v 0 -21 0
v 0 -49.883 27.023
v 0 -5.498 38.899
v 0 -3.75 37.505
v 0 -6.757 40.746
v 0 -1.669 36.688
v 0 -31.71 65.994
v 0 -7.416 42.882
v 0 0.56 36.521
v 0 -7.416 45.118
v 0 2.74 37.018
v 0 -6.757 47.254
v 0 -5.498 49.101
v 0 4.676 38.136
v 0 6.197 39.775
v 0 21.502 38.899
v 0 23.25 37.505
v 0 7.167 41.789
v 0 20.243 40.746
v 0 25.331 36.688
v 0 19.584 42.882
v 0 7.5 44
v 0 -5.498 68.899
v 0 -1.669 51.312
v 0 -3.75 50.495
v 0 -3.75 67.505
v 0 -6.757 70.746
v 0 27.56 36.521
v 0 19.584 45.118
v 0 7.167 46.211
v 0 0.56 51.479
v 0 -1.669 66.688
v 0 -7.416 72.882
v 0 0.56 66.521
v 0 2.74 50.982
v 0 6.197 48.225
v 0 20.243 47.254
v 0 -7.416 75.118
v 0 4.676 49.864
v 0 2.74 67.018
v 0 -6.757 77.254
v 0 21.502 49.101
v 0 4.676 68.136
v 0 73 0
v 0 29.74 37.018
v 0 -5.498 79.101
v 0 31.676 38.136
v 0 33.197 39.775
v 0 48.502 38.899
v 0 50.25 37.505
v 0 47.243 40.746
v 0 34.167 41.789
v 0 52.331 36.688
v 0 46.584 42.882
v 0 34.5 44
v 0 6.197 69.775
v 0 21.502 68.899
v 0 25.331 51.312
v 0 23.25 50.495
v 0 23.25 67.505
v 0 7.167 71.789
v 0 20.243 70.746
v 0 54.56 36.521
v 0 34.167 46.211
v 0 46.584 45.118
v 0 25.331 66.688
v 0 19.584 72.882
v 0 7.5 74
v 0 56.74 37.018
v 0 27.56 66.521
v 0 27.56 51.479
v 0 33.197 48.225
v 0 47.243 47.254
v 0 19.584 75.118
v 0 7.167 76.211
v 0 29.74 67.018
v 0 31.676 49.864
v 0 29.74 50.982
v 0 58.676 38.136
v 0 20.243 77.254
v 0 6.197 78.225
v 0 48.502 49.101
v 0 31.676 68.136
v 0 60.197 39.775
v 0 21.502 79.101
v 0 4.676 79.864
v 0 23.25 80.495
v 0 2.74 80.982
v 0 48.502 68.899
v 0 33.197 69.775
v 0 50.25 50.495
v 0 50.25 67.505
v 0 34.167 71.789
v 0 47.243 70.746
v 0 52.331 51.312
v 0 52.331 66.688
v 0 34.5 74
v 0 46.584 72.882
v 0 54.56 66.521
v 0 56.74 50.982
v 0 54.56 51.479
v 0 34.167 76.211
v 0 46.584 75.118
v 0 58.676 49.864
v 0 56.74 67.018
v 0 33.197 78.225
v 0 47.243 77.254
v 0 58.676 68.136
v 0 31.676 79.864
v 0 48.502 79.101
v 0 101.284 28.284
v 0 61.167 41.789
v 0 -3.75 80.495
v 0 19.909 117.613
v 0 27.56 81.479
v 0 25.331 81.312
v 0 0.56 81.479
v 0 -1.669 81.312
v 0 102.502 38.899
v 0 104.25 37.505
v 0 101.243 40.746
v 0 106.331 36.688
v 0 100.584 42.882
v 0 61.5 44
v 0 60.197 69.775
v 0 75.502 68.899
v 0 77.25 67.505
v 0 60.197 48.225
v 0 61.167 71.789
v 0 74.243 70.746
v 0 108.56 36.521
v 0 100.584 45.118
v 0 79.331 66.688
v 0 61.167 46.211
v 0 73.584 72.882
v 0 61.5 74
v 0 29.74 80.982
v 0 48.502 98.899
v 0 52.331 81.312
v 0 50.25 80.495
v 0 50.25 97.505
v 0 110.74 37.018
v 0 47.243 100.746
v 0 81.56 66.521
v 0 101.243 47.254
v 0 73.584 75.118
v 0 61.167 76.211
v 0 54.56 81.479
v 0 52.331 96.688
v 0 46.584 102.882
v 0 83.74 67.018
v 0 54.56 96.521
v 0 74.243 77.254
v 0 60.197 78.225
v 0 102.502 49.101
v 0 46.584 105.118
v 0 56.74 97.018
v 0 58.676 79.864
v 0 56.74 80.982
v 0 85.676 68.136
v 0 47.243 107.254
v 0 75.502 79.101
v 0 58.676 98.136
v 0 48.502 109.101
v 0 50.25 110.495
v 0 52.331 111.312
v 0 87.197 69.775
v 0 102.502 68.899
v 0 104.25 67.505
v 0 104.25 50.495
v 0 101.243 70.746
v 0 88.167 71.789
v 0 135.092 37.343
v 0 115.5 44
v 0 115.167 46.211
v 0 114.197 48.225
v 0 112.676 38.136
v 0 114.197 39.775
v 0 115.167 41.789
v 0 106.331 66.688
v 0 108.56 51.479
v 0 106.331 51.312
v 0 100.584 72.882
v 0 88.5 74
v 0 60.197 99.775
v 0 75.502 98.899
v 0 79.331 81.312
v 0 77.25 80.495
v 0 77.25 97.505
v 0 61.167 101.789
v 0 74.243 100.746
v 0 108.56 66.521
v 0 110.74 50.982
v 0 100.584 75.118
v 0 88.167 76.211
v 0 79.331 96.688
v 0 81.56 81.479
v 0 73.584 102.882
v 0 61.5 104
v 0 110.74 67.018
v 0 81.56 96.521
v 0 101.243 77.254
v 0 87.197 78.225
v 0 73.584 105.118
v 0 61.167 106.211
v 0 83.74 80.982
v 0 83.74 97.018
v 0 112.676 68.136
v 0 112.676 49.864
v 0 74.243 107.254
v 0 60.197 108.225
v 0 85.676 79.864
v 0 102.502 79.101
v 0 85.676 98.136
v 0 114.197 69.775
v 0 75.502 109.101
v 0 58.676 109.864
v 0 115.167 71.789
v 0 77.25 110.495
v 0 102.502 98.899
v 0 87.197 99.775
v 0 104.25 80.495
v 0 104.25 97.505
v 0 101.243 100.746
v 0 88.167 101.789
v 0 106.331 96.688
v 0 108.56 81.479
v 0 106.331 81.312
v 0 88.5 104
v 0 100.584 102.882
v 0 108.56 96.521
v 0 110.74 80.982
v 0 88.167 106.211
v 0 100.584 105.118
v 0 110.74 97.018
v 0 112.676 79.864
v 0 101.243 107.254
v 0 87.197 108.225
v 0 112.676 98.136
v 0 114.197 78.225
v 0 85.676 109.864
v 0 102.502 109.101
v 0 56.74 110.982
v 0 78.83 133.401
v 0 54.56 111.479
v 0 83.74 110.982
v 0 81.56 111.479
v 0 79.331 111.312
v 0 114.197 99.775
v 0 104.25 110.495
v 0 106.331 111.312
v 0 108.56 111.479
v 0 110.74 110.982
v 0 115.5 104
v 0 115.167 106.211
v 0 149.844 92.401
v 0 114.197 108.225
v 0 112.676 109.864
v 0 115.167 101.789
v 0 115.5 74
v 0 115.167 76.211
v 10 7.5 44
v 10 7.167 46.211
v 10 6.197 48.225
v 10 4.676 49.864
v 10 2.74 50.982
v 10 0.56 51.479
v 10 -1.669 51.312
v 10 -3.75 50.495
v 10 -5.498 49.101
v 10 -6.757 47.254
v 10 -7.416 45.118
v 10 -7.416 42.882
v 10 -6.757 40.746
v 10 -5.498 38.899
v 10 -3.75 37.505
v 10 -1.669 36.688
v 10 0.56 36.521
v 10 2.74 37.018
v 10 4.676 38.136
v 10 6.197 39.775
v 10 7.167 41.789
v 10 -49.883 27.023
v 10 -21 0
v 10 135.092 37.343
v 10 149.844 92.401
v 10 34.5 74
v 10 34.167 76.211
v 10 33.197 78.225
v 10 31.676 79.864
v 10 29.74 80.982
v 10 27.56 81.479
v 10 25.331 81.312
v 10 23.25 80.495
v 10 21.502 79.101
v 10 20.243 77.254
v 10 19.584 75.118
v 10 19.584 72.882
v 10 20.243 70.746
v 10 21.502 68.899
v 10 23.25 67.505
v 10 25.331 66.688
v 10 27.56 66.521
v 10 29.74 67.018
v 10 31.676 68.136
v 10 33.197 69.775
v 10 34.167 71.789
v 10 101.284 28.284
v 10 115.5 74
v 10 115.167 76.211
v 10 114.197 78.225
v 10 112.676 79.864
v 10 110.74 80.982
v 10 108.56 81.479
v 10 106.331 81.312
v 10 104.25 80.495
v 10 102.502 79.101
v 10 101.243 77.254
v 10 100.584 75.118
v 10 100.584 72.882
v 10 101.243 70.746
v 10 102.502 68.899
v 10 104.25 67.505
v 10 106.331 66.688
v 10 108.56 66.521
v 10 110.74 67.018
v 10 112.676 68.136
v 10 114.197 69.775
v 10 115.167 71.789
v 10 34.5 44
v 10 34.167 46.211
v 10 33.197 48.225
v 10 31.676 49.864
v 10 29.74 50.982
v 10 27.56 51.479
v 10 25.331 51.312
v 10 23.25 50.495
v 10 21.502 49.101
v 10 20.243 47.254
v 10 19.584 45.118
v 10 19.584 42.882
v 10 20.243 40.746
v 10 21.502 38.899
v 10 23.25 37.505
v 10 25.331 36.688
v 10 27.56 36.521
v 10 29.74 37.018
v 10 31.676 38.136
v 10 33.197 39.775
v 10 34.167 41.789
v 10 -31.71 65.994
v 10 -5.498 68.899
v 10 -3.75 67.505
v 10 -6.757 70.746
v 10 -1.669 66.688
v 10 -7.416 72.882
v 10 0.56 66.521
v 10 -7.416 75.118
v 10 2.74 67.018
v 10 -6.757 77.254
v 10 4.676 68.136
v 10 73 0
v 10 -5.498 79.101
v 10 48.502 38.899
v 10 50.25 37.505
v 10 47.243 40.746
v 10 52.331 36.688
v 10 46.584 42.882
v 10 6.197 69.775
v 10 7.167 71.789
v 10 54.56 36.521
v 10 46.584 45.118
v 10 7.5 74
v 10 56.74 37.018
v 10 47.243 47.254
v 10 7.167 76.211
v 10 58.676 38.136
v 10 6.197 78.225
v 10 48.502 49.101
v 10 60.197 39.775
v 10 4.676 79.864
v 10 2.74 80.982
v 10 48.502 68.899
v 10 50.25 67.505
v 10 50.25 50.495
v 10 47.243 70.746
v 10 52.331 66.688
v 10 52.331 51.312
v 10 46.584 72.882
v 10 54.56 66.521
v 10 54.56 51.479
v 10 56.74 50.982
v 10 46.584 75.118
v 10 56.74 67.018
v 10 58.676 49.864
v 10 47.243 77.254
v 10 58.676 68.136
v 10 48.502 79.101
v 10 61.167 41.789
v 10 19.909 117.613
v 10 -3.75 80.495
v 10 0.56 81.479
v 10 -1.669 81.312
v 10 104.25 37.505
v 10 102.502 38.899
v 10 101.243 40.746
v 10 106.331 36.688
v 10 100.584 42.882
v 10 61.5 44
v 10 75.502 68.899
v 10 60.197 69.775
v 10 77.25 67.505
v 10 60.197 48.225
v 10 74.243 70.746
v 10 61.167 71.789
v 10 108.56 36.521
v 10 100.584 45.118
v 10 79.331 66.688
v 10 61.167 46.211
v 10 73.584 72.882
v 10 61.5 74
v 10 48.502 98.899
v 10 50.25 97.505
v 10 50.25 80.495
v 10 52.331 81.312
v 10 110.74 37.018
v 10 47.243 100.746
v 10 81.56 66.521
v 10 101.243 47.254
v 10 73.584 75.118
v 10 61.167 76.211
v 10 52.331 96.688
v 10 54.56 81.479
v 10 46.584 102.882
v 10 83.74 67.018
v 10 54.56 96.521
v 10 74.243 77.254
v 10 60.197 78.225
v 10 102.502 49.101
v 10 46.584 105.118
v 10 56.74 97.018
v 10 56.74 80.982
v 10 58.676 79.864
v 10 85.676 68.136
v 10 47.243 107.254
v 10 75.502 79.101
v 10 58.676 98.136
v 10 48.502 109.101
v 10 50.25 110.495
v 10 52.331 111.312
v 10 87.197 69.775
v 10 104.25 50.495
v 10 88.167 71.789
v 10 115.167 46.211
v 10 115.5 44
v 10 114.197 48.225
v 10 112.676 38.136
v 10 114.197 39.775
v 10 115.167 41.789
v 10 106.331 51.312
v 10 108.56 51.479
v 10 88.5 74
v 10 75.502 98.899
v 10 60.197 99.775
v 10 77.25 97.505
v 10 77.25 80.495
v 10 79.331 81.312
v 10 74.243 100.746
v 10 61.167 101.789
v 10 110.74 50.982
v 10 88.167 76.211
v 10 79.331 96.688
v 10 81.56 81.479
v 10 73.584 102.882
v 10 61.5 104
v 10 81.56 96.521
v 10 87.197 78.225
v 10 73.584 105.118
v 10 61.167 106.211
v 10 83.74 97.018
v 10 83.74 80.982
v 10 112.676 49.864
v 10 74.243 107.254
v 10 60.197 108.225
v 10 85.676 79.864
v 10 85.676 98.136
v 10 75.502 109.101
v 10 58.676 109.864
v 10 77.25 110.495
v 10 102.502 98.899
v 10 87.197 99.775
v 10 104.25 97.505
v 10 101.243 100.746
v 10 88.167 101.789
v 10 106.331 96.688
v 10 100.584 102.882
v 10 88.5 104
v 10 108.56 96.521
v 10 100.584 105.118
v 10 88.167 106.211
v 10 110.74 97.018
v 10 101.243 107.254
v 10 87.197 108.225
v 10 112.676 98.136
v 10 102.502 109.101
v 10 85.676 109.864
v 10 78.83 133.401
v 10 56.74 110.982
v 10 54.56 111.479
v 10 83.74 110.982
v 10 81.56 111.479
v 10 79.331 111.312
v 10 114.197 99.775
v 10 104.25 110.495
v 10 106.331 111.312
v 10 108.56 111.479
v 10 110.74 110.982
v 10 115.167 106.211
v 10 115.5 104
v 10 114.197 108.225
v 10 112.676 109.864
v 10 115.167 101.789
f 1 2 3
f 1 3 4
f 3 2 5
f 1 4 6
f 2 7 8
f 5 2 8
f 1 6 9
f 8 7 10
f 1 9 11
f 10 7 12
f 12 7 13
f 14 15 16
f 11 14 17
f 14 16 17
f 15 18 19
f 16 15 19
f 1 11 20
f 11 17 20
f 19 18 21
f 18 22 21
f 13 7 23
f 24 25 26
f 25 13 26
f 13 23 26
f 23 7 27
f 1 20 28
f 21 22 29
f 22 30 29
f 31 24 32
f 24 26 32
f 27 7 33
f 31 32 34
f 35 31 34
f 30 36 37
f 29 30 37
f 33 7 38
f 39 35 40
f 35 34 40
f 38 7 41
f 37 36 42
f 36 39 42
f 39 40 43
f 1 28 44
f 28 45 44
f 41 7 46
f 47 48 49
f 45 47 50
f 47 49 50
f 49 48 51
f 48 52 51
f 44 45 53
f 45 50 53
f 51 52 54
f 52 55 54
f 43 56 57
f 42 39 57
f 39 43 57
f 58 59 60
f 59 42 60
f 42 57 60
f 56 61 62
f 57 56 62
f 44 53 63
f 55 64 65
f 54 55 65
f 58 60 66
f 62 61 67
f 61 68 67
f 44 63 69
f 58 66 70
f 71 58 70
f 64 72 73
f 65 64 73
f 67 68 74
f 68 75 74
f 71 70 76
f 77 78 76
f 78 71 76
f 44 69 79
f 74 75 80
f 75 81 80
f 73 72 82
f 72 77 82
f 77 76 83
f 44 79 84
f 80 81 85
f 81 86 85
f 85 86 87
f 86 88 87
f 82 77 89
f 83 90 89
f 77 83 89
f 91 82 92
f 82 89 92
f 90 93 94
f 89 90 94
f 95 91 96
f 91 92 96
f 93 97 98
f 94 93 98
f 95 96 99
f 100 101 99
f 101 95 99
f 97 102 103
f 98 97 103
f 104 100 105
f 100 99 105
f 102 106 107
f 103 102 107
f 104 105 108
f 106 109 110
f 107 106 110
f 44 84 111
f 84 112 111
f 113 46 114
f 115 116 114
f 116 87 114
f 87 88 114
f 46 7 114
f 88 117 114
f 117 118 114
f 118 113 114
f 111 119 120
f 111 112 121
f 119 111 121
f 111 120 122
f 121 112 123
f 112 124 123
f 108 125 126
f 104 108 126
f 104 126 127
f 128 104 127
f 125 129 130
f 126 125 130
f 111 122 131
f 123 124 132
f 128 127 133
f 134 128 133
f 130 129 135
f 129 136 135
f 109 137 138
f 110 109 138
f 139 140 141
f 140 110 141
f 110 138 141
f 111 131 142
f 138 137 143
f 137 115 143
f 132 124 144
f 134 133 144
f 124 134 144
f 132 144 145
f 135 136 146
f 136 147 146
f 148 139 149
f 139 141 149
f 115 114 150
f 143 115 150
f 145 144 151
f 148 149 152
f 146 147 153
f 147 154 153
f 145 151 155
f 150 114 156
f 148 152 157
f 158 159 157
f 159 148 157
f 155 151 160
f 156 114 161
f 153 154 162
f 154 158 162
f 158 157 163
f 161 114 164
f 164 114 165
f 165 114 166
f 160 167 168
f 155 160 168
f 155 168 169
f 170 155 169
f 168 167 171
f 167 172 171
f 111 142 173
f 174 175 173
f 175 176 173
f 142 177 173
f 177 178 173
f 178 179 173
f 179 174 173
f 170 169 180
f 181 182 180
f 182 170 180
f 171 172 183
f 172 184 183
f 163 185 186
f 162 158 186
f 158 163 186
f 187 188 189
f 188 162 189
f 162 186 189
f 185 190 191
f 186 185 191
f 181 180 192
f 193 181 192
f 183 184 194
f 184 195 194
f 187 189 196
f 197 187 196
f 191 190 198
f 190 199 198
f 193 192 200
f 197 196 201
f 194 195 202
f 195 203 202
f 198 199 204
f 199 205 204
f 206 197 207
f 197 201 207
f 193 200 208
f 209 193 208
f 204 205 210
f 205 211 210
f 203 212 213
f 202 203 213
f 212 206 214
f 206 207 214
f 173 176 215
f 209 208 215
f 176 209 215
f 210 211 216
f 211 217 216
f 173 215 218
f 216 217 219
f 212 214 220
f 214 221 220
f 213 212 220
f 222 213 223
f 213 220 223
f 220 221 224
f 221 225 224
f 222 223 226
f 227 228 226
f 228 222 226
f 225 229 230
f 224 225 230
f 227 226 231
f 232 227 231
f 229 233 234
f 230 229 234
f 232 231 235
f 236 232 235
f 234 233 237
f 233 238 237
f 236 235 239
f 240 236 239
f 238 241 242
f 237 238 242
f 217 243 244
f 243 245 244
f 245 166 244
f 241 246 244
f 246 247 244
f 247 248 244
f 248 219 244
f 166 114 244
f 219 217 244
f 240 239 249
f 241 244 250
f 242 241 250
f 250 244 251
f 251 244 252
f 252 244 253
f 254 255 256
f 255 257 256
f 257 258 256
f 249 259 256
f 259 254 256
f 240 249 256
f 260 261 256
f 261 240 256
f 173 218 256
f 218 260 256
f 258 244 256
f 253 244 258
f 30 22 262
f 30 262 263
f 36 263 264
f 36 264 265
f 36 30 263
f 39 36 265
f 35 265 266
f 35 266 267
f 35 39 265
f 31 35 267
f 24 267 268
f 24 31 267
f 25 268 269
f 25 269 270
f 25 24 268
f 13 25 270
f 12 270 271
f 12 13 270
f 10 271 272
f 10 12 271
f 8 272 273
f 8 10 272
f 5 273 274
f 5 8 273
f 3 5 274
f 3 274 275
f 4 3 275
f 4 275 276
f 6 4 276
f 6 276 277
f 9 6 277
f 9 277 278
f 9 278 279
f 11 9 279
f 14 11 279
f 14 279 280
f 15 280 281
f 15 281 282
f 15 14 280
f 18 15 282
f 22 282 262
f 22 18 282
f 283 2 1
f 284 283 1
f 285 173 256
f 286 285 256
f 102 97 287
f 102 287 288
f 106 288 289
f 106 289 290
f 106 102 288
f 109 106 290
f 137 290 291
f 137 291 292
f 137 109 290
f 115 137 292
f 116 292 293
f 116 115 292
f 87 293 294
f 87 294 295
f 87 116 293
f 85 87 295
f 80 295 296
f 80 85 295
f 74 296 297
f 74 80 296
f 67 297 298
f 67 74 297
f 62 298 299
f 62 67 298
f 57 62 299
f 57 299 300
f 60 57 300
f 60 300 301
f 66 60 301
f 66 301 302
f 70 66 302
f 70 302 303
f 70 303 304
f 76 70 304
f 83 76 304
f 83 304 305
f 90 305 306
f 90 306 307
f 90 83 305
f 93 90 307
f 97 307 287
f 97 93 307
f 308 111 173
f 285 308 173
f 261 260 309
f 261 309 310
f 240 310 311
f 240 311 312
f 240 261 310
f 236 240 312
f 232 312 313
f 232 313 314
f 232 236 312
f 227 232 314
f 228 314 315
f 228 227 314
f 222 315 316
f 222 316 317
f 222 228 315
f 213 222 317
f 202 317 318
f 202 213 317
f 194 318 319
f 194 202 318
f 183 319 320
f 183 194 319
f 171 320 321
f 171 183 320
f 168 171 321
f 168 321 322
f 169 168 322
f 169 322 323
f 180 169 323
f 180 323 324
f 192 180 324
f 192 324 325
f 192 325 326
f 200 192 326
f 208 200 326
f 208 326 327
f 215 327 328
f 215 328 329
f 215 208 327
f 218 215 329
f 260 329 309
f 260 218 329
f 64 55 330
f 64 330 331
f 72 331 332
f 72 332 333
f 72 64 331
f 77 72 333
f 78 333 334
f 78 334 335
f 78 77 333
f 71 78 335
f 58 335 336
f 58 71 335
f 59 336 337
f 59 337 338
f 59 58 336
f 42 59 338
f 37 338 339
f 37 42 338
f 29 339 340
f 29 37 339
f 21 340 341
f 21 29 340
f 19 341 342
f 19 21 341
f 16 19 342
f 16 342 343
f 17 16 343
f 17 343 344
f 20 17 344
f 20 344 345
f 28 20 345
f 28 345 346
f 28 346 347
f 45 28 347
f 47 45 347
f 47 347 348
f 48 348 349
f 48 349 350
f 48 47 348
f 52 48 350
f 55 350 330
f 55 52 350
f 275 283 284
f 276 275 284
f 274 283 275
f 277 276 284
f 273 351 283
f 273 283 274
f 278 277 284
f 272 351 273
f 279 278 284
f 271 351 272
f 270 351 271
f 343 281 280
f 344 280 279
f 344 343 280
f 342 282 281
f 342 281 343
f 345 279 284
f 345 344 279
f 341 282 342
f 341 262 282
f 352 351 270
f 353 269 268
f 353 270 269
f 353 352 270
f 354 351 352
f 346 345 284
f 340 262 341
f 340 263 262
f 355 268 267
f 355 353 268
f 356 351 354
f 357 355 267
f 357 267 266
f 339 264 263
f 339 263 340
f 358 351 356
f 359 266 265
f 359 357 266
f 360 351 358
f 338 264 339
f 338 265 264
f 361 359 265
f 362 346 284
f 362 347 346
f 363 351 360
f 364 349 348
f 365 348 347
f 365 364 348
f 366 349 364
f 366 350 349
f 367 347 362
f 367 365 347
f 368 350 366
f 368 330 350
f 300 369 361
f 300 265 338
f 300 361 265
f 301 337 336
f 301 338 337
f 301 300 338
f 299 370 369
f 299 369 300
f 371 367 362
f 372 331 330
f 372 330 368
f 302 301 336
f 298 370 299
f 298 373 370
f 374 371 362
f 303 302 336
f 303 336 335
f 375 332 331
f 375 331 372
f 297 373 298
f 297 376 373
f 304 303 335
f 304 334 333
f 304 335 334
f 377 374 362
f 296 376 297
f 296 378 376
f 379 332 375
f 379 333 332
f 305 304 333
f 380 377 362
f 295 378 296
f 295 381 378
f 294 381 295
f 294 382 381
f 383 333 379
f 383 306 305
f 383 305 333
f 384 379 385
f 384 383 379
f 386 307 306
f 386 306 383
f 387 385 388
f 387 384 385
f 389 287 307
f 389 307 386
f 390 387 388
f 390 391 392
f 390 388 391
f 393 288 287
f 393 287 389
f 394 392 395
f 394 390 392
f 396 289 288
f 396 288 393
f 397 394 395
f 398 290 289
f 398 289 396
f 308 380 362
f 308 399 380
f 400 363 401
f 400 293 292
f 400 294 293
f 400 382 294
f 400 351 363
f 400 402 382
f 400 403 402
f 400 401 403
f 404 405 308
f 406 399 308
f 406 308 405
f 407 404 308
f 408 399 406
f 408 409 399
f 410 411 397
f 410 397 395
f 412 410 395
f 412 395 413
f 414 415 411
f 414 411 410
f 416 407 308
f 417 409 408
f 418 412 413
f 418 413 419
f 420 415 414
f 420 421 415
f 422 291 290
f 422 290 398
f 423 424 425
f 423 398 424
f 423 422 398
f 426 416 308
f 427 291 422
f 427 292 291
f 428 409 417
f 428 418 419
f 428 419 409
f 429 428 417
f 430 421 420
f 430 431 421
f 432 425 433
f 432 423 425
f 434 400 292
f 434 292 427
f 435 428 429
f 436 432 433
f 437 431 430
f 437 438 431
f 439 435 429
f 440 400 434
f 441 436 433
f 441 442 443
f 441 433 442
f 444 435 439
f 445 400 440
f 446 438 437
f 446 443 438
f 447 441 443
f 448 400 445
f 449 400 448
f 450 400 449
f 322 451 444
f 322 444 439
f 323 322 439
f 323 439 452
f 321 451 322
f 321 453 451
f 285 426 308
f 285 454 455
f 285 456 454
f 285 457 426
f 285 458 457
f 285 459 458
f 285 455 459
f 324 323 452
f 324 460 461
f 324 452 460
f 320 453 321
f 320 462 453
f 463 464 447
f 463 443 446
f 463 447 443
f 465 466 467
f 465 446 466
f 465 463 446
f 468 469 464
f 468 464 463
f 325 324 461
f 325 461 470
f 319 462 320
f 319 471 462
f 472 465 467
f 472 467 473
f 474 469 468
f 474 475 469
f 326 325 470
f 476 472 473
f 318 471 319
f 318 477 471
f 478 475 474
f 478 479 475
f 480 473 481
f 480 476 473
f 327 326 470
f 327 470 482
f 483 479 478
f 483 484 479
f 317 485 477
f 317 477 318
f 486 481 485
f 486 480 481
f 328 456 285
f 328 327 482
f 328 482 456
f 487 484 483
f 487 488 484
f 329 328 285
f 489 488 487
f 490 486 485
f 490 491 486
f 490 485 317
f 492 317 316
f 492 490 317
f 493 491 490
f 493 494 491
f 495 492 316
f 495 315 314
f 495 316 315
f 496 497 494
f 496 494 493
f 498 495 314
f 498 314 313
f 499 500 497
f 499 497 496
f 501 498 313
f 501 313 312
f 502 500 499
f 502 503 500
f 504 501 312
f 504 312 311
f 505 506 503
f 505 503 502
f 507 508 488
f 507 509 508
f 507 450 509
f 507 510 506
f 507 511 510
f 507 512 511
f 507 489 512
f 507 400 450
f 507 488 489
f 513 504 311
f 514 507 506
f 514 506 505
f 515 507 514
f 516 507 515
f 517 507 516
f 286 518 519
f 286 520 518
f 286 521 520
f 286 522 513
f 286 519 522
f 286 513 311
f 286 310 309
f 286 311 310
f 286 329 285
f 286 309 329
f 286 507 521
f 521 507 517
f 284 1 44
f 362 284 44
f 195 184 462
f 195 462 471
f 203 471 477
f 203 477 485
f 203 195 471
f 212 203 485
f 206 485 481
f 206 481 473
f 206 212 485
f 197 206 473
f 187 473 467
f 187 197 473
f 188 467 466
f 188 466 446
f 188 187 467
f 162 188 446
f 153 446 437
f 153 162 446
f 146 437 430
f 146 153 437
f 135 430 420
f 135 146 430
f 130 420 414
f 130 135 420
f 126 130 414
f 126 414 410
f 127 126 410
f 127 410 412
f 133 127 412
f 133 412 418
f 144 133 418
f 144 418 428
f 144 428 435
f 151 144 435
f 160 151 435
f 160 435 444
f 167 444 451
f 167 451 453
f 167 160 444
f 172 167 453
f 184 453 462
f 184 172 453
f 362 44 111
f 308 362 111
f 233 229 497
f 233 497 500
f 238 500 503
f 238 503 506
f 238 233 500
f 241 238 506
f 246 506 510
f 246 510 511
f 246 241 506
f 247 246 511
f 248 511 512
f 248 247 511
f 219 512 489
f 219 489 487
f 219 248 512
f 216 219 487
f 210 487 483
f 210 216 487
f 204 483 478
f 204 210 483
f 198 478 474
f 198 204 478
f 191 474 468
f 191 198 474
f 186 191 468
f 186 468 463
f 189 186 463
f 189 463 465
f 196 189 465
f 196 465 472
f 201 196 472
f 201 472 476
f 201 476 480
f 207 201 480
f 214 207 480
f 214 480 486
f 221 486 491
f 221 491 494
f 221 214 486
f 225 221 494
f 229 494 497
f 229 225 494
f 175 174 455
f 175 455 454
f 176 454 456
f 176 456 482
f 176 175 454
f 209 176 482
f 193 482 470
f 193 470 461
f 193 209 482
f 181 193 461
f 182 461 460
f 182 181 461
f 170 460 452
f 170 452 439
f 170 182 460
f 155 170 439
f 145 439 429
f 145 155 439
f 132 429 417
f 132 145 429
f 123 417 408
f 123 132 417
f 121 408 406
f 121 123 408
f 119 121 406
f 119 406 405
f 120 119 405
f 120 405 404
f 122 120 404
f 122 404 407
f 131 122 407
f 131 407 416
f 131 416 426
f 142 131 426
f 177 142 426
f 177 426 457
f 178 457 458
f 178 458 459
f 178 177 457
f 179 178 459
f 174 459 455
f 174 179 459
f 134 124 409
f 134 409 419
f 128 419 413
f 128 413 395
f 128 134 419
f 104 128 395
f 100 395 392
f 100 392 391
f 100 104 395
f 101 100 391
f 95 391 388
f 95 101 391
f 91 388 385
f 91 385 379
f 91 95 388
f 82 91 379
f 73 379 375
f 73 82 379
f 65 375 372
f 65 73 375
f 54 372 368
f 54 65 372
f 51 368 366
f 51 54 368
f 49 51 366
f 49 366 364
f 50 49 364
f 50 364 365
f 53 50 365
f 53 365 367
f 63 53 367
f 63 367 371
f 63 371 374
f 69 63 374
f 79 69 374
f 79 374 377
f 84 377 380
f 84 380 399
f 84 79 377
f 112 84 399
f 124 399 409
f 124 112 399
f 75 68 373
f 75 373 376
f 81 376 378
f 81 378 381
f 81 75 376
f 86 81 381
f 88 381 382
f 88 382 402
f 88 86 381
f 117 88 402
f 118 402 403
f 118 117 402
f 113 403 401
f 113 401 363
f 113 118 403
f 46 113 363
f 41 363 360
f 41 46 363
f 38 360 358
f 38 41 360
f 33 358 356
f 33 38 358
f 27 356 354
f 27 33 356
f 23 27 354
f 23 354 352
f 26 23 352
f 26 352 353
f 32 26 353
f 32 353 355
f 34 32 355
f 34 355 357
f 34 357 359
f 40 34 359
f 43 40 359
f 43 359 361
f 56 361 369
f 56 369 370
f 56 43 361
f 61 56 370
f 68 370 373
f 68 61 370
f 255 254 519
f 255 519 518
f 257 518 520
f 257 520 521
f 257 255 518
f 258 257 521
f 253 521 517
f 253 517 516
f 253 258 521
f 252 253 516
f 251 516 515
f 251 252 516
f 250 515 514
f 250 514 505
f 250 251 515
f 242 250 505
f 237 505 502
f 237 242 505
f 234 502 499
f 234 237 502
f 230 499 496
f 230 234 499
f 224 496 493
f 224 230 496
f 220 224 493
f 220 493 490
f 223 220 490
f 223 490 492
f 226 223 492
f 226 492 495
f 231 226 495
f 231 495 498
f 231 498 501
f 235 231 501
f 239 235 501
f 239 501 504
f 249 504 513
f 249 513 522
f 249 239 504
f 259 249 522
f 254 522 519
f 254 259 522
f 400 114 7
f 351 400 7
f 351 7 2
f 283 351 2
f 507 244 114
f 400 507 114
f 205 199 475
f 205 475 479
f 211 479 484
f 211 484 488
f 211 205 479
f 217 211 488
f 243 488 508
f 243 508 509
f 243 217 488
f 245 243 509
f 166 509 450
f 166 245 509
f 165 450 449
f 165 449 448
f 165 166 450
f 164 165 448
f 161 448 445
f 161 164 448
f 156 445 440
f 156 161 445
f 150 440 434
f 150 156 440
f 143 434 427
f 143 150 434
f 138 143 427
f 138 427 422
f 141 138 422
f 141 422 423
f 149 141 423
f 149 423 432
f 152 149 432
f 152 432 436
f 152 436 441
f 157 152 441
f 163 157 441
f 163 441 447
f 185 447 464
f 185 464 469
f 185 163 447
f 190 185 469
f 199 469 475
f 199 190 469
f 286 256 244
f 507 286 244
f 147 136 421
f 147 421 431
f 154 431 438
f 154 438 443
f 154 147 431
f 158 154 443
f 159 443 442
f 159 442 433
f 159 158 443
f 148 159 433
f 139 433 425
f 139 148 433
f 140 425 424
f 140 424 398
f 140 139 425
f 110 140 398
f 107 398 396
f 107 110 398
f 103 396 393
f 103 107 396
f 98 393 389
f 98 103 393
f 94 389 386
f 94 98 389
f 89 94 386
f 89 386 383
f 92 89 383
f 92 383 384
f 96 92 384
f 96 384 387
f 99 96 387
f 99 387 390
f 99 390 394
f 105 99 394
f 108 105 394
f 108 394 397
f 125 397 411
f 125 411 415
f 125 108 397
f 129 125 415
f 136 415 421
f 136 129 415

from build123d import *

# Parameters (mm, degrees)
F0_R     = 7.5
F1_DEPTH = 10


with BuildPart() as f1:
    # F0 (on Right) → F1 (new body)
    with BuildSketch(Plane.YZ):
        Polygon((-21, 0), (73, 0), (101.284271, 28.284271), (135.091675, 37.342938), (149.844361, 92.40071), (78.830278, 133.40071), (19.908802, 117.612748), (-31.709993, 65.993953), (-49.882578, 27.022718), align=None)
        with Locations((0, 44)):
            Circle(F0_R, mode=Mode.SUBTRACT)
        with Locations((27, 44)):
            Circle(F0_R, mode=Mode.SUBTRACT)
        with Locations((54, 44)):
            Circle(F0_R, mode=Mode.SUBTRACT)
        with Locations((108, 44)):
            Circle(F0_R, mode=Mode.SUBTRACT)
        with Locations((0, 74)):
            Circle(F0_R, mode=Mode.SUBTRACT)
        with Locations((27, 74)):
            Circle(F0_R, mode=Mode.SUBTRACT)
        with Locations((54, 74)):
            Circle(F0_R, mode=Mode.SUBTRACT)
        with Locations((81, 74)):
            Circle(F0_R, mode=Mode.SUBTRACT)
        with Locations((108, 74)):
            Circle(F0_R, mode=Mode.SUBTRACT)
        with Locations((54, 104)):
            Circle(F0_R, mode=Mode.SUBTRACT)
        with Locations((81, 104)):
            Circle(F0_R, mode=Mode.SUBTRACT)
        with Locations((108, 104)):
            Circle(F0_R, mode=Mode.SUBTRACT)
    extrude(amount=F1_DEPTH)


solid = f1.part
